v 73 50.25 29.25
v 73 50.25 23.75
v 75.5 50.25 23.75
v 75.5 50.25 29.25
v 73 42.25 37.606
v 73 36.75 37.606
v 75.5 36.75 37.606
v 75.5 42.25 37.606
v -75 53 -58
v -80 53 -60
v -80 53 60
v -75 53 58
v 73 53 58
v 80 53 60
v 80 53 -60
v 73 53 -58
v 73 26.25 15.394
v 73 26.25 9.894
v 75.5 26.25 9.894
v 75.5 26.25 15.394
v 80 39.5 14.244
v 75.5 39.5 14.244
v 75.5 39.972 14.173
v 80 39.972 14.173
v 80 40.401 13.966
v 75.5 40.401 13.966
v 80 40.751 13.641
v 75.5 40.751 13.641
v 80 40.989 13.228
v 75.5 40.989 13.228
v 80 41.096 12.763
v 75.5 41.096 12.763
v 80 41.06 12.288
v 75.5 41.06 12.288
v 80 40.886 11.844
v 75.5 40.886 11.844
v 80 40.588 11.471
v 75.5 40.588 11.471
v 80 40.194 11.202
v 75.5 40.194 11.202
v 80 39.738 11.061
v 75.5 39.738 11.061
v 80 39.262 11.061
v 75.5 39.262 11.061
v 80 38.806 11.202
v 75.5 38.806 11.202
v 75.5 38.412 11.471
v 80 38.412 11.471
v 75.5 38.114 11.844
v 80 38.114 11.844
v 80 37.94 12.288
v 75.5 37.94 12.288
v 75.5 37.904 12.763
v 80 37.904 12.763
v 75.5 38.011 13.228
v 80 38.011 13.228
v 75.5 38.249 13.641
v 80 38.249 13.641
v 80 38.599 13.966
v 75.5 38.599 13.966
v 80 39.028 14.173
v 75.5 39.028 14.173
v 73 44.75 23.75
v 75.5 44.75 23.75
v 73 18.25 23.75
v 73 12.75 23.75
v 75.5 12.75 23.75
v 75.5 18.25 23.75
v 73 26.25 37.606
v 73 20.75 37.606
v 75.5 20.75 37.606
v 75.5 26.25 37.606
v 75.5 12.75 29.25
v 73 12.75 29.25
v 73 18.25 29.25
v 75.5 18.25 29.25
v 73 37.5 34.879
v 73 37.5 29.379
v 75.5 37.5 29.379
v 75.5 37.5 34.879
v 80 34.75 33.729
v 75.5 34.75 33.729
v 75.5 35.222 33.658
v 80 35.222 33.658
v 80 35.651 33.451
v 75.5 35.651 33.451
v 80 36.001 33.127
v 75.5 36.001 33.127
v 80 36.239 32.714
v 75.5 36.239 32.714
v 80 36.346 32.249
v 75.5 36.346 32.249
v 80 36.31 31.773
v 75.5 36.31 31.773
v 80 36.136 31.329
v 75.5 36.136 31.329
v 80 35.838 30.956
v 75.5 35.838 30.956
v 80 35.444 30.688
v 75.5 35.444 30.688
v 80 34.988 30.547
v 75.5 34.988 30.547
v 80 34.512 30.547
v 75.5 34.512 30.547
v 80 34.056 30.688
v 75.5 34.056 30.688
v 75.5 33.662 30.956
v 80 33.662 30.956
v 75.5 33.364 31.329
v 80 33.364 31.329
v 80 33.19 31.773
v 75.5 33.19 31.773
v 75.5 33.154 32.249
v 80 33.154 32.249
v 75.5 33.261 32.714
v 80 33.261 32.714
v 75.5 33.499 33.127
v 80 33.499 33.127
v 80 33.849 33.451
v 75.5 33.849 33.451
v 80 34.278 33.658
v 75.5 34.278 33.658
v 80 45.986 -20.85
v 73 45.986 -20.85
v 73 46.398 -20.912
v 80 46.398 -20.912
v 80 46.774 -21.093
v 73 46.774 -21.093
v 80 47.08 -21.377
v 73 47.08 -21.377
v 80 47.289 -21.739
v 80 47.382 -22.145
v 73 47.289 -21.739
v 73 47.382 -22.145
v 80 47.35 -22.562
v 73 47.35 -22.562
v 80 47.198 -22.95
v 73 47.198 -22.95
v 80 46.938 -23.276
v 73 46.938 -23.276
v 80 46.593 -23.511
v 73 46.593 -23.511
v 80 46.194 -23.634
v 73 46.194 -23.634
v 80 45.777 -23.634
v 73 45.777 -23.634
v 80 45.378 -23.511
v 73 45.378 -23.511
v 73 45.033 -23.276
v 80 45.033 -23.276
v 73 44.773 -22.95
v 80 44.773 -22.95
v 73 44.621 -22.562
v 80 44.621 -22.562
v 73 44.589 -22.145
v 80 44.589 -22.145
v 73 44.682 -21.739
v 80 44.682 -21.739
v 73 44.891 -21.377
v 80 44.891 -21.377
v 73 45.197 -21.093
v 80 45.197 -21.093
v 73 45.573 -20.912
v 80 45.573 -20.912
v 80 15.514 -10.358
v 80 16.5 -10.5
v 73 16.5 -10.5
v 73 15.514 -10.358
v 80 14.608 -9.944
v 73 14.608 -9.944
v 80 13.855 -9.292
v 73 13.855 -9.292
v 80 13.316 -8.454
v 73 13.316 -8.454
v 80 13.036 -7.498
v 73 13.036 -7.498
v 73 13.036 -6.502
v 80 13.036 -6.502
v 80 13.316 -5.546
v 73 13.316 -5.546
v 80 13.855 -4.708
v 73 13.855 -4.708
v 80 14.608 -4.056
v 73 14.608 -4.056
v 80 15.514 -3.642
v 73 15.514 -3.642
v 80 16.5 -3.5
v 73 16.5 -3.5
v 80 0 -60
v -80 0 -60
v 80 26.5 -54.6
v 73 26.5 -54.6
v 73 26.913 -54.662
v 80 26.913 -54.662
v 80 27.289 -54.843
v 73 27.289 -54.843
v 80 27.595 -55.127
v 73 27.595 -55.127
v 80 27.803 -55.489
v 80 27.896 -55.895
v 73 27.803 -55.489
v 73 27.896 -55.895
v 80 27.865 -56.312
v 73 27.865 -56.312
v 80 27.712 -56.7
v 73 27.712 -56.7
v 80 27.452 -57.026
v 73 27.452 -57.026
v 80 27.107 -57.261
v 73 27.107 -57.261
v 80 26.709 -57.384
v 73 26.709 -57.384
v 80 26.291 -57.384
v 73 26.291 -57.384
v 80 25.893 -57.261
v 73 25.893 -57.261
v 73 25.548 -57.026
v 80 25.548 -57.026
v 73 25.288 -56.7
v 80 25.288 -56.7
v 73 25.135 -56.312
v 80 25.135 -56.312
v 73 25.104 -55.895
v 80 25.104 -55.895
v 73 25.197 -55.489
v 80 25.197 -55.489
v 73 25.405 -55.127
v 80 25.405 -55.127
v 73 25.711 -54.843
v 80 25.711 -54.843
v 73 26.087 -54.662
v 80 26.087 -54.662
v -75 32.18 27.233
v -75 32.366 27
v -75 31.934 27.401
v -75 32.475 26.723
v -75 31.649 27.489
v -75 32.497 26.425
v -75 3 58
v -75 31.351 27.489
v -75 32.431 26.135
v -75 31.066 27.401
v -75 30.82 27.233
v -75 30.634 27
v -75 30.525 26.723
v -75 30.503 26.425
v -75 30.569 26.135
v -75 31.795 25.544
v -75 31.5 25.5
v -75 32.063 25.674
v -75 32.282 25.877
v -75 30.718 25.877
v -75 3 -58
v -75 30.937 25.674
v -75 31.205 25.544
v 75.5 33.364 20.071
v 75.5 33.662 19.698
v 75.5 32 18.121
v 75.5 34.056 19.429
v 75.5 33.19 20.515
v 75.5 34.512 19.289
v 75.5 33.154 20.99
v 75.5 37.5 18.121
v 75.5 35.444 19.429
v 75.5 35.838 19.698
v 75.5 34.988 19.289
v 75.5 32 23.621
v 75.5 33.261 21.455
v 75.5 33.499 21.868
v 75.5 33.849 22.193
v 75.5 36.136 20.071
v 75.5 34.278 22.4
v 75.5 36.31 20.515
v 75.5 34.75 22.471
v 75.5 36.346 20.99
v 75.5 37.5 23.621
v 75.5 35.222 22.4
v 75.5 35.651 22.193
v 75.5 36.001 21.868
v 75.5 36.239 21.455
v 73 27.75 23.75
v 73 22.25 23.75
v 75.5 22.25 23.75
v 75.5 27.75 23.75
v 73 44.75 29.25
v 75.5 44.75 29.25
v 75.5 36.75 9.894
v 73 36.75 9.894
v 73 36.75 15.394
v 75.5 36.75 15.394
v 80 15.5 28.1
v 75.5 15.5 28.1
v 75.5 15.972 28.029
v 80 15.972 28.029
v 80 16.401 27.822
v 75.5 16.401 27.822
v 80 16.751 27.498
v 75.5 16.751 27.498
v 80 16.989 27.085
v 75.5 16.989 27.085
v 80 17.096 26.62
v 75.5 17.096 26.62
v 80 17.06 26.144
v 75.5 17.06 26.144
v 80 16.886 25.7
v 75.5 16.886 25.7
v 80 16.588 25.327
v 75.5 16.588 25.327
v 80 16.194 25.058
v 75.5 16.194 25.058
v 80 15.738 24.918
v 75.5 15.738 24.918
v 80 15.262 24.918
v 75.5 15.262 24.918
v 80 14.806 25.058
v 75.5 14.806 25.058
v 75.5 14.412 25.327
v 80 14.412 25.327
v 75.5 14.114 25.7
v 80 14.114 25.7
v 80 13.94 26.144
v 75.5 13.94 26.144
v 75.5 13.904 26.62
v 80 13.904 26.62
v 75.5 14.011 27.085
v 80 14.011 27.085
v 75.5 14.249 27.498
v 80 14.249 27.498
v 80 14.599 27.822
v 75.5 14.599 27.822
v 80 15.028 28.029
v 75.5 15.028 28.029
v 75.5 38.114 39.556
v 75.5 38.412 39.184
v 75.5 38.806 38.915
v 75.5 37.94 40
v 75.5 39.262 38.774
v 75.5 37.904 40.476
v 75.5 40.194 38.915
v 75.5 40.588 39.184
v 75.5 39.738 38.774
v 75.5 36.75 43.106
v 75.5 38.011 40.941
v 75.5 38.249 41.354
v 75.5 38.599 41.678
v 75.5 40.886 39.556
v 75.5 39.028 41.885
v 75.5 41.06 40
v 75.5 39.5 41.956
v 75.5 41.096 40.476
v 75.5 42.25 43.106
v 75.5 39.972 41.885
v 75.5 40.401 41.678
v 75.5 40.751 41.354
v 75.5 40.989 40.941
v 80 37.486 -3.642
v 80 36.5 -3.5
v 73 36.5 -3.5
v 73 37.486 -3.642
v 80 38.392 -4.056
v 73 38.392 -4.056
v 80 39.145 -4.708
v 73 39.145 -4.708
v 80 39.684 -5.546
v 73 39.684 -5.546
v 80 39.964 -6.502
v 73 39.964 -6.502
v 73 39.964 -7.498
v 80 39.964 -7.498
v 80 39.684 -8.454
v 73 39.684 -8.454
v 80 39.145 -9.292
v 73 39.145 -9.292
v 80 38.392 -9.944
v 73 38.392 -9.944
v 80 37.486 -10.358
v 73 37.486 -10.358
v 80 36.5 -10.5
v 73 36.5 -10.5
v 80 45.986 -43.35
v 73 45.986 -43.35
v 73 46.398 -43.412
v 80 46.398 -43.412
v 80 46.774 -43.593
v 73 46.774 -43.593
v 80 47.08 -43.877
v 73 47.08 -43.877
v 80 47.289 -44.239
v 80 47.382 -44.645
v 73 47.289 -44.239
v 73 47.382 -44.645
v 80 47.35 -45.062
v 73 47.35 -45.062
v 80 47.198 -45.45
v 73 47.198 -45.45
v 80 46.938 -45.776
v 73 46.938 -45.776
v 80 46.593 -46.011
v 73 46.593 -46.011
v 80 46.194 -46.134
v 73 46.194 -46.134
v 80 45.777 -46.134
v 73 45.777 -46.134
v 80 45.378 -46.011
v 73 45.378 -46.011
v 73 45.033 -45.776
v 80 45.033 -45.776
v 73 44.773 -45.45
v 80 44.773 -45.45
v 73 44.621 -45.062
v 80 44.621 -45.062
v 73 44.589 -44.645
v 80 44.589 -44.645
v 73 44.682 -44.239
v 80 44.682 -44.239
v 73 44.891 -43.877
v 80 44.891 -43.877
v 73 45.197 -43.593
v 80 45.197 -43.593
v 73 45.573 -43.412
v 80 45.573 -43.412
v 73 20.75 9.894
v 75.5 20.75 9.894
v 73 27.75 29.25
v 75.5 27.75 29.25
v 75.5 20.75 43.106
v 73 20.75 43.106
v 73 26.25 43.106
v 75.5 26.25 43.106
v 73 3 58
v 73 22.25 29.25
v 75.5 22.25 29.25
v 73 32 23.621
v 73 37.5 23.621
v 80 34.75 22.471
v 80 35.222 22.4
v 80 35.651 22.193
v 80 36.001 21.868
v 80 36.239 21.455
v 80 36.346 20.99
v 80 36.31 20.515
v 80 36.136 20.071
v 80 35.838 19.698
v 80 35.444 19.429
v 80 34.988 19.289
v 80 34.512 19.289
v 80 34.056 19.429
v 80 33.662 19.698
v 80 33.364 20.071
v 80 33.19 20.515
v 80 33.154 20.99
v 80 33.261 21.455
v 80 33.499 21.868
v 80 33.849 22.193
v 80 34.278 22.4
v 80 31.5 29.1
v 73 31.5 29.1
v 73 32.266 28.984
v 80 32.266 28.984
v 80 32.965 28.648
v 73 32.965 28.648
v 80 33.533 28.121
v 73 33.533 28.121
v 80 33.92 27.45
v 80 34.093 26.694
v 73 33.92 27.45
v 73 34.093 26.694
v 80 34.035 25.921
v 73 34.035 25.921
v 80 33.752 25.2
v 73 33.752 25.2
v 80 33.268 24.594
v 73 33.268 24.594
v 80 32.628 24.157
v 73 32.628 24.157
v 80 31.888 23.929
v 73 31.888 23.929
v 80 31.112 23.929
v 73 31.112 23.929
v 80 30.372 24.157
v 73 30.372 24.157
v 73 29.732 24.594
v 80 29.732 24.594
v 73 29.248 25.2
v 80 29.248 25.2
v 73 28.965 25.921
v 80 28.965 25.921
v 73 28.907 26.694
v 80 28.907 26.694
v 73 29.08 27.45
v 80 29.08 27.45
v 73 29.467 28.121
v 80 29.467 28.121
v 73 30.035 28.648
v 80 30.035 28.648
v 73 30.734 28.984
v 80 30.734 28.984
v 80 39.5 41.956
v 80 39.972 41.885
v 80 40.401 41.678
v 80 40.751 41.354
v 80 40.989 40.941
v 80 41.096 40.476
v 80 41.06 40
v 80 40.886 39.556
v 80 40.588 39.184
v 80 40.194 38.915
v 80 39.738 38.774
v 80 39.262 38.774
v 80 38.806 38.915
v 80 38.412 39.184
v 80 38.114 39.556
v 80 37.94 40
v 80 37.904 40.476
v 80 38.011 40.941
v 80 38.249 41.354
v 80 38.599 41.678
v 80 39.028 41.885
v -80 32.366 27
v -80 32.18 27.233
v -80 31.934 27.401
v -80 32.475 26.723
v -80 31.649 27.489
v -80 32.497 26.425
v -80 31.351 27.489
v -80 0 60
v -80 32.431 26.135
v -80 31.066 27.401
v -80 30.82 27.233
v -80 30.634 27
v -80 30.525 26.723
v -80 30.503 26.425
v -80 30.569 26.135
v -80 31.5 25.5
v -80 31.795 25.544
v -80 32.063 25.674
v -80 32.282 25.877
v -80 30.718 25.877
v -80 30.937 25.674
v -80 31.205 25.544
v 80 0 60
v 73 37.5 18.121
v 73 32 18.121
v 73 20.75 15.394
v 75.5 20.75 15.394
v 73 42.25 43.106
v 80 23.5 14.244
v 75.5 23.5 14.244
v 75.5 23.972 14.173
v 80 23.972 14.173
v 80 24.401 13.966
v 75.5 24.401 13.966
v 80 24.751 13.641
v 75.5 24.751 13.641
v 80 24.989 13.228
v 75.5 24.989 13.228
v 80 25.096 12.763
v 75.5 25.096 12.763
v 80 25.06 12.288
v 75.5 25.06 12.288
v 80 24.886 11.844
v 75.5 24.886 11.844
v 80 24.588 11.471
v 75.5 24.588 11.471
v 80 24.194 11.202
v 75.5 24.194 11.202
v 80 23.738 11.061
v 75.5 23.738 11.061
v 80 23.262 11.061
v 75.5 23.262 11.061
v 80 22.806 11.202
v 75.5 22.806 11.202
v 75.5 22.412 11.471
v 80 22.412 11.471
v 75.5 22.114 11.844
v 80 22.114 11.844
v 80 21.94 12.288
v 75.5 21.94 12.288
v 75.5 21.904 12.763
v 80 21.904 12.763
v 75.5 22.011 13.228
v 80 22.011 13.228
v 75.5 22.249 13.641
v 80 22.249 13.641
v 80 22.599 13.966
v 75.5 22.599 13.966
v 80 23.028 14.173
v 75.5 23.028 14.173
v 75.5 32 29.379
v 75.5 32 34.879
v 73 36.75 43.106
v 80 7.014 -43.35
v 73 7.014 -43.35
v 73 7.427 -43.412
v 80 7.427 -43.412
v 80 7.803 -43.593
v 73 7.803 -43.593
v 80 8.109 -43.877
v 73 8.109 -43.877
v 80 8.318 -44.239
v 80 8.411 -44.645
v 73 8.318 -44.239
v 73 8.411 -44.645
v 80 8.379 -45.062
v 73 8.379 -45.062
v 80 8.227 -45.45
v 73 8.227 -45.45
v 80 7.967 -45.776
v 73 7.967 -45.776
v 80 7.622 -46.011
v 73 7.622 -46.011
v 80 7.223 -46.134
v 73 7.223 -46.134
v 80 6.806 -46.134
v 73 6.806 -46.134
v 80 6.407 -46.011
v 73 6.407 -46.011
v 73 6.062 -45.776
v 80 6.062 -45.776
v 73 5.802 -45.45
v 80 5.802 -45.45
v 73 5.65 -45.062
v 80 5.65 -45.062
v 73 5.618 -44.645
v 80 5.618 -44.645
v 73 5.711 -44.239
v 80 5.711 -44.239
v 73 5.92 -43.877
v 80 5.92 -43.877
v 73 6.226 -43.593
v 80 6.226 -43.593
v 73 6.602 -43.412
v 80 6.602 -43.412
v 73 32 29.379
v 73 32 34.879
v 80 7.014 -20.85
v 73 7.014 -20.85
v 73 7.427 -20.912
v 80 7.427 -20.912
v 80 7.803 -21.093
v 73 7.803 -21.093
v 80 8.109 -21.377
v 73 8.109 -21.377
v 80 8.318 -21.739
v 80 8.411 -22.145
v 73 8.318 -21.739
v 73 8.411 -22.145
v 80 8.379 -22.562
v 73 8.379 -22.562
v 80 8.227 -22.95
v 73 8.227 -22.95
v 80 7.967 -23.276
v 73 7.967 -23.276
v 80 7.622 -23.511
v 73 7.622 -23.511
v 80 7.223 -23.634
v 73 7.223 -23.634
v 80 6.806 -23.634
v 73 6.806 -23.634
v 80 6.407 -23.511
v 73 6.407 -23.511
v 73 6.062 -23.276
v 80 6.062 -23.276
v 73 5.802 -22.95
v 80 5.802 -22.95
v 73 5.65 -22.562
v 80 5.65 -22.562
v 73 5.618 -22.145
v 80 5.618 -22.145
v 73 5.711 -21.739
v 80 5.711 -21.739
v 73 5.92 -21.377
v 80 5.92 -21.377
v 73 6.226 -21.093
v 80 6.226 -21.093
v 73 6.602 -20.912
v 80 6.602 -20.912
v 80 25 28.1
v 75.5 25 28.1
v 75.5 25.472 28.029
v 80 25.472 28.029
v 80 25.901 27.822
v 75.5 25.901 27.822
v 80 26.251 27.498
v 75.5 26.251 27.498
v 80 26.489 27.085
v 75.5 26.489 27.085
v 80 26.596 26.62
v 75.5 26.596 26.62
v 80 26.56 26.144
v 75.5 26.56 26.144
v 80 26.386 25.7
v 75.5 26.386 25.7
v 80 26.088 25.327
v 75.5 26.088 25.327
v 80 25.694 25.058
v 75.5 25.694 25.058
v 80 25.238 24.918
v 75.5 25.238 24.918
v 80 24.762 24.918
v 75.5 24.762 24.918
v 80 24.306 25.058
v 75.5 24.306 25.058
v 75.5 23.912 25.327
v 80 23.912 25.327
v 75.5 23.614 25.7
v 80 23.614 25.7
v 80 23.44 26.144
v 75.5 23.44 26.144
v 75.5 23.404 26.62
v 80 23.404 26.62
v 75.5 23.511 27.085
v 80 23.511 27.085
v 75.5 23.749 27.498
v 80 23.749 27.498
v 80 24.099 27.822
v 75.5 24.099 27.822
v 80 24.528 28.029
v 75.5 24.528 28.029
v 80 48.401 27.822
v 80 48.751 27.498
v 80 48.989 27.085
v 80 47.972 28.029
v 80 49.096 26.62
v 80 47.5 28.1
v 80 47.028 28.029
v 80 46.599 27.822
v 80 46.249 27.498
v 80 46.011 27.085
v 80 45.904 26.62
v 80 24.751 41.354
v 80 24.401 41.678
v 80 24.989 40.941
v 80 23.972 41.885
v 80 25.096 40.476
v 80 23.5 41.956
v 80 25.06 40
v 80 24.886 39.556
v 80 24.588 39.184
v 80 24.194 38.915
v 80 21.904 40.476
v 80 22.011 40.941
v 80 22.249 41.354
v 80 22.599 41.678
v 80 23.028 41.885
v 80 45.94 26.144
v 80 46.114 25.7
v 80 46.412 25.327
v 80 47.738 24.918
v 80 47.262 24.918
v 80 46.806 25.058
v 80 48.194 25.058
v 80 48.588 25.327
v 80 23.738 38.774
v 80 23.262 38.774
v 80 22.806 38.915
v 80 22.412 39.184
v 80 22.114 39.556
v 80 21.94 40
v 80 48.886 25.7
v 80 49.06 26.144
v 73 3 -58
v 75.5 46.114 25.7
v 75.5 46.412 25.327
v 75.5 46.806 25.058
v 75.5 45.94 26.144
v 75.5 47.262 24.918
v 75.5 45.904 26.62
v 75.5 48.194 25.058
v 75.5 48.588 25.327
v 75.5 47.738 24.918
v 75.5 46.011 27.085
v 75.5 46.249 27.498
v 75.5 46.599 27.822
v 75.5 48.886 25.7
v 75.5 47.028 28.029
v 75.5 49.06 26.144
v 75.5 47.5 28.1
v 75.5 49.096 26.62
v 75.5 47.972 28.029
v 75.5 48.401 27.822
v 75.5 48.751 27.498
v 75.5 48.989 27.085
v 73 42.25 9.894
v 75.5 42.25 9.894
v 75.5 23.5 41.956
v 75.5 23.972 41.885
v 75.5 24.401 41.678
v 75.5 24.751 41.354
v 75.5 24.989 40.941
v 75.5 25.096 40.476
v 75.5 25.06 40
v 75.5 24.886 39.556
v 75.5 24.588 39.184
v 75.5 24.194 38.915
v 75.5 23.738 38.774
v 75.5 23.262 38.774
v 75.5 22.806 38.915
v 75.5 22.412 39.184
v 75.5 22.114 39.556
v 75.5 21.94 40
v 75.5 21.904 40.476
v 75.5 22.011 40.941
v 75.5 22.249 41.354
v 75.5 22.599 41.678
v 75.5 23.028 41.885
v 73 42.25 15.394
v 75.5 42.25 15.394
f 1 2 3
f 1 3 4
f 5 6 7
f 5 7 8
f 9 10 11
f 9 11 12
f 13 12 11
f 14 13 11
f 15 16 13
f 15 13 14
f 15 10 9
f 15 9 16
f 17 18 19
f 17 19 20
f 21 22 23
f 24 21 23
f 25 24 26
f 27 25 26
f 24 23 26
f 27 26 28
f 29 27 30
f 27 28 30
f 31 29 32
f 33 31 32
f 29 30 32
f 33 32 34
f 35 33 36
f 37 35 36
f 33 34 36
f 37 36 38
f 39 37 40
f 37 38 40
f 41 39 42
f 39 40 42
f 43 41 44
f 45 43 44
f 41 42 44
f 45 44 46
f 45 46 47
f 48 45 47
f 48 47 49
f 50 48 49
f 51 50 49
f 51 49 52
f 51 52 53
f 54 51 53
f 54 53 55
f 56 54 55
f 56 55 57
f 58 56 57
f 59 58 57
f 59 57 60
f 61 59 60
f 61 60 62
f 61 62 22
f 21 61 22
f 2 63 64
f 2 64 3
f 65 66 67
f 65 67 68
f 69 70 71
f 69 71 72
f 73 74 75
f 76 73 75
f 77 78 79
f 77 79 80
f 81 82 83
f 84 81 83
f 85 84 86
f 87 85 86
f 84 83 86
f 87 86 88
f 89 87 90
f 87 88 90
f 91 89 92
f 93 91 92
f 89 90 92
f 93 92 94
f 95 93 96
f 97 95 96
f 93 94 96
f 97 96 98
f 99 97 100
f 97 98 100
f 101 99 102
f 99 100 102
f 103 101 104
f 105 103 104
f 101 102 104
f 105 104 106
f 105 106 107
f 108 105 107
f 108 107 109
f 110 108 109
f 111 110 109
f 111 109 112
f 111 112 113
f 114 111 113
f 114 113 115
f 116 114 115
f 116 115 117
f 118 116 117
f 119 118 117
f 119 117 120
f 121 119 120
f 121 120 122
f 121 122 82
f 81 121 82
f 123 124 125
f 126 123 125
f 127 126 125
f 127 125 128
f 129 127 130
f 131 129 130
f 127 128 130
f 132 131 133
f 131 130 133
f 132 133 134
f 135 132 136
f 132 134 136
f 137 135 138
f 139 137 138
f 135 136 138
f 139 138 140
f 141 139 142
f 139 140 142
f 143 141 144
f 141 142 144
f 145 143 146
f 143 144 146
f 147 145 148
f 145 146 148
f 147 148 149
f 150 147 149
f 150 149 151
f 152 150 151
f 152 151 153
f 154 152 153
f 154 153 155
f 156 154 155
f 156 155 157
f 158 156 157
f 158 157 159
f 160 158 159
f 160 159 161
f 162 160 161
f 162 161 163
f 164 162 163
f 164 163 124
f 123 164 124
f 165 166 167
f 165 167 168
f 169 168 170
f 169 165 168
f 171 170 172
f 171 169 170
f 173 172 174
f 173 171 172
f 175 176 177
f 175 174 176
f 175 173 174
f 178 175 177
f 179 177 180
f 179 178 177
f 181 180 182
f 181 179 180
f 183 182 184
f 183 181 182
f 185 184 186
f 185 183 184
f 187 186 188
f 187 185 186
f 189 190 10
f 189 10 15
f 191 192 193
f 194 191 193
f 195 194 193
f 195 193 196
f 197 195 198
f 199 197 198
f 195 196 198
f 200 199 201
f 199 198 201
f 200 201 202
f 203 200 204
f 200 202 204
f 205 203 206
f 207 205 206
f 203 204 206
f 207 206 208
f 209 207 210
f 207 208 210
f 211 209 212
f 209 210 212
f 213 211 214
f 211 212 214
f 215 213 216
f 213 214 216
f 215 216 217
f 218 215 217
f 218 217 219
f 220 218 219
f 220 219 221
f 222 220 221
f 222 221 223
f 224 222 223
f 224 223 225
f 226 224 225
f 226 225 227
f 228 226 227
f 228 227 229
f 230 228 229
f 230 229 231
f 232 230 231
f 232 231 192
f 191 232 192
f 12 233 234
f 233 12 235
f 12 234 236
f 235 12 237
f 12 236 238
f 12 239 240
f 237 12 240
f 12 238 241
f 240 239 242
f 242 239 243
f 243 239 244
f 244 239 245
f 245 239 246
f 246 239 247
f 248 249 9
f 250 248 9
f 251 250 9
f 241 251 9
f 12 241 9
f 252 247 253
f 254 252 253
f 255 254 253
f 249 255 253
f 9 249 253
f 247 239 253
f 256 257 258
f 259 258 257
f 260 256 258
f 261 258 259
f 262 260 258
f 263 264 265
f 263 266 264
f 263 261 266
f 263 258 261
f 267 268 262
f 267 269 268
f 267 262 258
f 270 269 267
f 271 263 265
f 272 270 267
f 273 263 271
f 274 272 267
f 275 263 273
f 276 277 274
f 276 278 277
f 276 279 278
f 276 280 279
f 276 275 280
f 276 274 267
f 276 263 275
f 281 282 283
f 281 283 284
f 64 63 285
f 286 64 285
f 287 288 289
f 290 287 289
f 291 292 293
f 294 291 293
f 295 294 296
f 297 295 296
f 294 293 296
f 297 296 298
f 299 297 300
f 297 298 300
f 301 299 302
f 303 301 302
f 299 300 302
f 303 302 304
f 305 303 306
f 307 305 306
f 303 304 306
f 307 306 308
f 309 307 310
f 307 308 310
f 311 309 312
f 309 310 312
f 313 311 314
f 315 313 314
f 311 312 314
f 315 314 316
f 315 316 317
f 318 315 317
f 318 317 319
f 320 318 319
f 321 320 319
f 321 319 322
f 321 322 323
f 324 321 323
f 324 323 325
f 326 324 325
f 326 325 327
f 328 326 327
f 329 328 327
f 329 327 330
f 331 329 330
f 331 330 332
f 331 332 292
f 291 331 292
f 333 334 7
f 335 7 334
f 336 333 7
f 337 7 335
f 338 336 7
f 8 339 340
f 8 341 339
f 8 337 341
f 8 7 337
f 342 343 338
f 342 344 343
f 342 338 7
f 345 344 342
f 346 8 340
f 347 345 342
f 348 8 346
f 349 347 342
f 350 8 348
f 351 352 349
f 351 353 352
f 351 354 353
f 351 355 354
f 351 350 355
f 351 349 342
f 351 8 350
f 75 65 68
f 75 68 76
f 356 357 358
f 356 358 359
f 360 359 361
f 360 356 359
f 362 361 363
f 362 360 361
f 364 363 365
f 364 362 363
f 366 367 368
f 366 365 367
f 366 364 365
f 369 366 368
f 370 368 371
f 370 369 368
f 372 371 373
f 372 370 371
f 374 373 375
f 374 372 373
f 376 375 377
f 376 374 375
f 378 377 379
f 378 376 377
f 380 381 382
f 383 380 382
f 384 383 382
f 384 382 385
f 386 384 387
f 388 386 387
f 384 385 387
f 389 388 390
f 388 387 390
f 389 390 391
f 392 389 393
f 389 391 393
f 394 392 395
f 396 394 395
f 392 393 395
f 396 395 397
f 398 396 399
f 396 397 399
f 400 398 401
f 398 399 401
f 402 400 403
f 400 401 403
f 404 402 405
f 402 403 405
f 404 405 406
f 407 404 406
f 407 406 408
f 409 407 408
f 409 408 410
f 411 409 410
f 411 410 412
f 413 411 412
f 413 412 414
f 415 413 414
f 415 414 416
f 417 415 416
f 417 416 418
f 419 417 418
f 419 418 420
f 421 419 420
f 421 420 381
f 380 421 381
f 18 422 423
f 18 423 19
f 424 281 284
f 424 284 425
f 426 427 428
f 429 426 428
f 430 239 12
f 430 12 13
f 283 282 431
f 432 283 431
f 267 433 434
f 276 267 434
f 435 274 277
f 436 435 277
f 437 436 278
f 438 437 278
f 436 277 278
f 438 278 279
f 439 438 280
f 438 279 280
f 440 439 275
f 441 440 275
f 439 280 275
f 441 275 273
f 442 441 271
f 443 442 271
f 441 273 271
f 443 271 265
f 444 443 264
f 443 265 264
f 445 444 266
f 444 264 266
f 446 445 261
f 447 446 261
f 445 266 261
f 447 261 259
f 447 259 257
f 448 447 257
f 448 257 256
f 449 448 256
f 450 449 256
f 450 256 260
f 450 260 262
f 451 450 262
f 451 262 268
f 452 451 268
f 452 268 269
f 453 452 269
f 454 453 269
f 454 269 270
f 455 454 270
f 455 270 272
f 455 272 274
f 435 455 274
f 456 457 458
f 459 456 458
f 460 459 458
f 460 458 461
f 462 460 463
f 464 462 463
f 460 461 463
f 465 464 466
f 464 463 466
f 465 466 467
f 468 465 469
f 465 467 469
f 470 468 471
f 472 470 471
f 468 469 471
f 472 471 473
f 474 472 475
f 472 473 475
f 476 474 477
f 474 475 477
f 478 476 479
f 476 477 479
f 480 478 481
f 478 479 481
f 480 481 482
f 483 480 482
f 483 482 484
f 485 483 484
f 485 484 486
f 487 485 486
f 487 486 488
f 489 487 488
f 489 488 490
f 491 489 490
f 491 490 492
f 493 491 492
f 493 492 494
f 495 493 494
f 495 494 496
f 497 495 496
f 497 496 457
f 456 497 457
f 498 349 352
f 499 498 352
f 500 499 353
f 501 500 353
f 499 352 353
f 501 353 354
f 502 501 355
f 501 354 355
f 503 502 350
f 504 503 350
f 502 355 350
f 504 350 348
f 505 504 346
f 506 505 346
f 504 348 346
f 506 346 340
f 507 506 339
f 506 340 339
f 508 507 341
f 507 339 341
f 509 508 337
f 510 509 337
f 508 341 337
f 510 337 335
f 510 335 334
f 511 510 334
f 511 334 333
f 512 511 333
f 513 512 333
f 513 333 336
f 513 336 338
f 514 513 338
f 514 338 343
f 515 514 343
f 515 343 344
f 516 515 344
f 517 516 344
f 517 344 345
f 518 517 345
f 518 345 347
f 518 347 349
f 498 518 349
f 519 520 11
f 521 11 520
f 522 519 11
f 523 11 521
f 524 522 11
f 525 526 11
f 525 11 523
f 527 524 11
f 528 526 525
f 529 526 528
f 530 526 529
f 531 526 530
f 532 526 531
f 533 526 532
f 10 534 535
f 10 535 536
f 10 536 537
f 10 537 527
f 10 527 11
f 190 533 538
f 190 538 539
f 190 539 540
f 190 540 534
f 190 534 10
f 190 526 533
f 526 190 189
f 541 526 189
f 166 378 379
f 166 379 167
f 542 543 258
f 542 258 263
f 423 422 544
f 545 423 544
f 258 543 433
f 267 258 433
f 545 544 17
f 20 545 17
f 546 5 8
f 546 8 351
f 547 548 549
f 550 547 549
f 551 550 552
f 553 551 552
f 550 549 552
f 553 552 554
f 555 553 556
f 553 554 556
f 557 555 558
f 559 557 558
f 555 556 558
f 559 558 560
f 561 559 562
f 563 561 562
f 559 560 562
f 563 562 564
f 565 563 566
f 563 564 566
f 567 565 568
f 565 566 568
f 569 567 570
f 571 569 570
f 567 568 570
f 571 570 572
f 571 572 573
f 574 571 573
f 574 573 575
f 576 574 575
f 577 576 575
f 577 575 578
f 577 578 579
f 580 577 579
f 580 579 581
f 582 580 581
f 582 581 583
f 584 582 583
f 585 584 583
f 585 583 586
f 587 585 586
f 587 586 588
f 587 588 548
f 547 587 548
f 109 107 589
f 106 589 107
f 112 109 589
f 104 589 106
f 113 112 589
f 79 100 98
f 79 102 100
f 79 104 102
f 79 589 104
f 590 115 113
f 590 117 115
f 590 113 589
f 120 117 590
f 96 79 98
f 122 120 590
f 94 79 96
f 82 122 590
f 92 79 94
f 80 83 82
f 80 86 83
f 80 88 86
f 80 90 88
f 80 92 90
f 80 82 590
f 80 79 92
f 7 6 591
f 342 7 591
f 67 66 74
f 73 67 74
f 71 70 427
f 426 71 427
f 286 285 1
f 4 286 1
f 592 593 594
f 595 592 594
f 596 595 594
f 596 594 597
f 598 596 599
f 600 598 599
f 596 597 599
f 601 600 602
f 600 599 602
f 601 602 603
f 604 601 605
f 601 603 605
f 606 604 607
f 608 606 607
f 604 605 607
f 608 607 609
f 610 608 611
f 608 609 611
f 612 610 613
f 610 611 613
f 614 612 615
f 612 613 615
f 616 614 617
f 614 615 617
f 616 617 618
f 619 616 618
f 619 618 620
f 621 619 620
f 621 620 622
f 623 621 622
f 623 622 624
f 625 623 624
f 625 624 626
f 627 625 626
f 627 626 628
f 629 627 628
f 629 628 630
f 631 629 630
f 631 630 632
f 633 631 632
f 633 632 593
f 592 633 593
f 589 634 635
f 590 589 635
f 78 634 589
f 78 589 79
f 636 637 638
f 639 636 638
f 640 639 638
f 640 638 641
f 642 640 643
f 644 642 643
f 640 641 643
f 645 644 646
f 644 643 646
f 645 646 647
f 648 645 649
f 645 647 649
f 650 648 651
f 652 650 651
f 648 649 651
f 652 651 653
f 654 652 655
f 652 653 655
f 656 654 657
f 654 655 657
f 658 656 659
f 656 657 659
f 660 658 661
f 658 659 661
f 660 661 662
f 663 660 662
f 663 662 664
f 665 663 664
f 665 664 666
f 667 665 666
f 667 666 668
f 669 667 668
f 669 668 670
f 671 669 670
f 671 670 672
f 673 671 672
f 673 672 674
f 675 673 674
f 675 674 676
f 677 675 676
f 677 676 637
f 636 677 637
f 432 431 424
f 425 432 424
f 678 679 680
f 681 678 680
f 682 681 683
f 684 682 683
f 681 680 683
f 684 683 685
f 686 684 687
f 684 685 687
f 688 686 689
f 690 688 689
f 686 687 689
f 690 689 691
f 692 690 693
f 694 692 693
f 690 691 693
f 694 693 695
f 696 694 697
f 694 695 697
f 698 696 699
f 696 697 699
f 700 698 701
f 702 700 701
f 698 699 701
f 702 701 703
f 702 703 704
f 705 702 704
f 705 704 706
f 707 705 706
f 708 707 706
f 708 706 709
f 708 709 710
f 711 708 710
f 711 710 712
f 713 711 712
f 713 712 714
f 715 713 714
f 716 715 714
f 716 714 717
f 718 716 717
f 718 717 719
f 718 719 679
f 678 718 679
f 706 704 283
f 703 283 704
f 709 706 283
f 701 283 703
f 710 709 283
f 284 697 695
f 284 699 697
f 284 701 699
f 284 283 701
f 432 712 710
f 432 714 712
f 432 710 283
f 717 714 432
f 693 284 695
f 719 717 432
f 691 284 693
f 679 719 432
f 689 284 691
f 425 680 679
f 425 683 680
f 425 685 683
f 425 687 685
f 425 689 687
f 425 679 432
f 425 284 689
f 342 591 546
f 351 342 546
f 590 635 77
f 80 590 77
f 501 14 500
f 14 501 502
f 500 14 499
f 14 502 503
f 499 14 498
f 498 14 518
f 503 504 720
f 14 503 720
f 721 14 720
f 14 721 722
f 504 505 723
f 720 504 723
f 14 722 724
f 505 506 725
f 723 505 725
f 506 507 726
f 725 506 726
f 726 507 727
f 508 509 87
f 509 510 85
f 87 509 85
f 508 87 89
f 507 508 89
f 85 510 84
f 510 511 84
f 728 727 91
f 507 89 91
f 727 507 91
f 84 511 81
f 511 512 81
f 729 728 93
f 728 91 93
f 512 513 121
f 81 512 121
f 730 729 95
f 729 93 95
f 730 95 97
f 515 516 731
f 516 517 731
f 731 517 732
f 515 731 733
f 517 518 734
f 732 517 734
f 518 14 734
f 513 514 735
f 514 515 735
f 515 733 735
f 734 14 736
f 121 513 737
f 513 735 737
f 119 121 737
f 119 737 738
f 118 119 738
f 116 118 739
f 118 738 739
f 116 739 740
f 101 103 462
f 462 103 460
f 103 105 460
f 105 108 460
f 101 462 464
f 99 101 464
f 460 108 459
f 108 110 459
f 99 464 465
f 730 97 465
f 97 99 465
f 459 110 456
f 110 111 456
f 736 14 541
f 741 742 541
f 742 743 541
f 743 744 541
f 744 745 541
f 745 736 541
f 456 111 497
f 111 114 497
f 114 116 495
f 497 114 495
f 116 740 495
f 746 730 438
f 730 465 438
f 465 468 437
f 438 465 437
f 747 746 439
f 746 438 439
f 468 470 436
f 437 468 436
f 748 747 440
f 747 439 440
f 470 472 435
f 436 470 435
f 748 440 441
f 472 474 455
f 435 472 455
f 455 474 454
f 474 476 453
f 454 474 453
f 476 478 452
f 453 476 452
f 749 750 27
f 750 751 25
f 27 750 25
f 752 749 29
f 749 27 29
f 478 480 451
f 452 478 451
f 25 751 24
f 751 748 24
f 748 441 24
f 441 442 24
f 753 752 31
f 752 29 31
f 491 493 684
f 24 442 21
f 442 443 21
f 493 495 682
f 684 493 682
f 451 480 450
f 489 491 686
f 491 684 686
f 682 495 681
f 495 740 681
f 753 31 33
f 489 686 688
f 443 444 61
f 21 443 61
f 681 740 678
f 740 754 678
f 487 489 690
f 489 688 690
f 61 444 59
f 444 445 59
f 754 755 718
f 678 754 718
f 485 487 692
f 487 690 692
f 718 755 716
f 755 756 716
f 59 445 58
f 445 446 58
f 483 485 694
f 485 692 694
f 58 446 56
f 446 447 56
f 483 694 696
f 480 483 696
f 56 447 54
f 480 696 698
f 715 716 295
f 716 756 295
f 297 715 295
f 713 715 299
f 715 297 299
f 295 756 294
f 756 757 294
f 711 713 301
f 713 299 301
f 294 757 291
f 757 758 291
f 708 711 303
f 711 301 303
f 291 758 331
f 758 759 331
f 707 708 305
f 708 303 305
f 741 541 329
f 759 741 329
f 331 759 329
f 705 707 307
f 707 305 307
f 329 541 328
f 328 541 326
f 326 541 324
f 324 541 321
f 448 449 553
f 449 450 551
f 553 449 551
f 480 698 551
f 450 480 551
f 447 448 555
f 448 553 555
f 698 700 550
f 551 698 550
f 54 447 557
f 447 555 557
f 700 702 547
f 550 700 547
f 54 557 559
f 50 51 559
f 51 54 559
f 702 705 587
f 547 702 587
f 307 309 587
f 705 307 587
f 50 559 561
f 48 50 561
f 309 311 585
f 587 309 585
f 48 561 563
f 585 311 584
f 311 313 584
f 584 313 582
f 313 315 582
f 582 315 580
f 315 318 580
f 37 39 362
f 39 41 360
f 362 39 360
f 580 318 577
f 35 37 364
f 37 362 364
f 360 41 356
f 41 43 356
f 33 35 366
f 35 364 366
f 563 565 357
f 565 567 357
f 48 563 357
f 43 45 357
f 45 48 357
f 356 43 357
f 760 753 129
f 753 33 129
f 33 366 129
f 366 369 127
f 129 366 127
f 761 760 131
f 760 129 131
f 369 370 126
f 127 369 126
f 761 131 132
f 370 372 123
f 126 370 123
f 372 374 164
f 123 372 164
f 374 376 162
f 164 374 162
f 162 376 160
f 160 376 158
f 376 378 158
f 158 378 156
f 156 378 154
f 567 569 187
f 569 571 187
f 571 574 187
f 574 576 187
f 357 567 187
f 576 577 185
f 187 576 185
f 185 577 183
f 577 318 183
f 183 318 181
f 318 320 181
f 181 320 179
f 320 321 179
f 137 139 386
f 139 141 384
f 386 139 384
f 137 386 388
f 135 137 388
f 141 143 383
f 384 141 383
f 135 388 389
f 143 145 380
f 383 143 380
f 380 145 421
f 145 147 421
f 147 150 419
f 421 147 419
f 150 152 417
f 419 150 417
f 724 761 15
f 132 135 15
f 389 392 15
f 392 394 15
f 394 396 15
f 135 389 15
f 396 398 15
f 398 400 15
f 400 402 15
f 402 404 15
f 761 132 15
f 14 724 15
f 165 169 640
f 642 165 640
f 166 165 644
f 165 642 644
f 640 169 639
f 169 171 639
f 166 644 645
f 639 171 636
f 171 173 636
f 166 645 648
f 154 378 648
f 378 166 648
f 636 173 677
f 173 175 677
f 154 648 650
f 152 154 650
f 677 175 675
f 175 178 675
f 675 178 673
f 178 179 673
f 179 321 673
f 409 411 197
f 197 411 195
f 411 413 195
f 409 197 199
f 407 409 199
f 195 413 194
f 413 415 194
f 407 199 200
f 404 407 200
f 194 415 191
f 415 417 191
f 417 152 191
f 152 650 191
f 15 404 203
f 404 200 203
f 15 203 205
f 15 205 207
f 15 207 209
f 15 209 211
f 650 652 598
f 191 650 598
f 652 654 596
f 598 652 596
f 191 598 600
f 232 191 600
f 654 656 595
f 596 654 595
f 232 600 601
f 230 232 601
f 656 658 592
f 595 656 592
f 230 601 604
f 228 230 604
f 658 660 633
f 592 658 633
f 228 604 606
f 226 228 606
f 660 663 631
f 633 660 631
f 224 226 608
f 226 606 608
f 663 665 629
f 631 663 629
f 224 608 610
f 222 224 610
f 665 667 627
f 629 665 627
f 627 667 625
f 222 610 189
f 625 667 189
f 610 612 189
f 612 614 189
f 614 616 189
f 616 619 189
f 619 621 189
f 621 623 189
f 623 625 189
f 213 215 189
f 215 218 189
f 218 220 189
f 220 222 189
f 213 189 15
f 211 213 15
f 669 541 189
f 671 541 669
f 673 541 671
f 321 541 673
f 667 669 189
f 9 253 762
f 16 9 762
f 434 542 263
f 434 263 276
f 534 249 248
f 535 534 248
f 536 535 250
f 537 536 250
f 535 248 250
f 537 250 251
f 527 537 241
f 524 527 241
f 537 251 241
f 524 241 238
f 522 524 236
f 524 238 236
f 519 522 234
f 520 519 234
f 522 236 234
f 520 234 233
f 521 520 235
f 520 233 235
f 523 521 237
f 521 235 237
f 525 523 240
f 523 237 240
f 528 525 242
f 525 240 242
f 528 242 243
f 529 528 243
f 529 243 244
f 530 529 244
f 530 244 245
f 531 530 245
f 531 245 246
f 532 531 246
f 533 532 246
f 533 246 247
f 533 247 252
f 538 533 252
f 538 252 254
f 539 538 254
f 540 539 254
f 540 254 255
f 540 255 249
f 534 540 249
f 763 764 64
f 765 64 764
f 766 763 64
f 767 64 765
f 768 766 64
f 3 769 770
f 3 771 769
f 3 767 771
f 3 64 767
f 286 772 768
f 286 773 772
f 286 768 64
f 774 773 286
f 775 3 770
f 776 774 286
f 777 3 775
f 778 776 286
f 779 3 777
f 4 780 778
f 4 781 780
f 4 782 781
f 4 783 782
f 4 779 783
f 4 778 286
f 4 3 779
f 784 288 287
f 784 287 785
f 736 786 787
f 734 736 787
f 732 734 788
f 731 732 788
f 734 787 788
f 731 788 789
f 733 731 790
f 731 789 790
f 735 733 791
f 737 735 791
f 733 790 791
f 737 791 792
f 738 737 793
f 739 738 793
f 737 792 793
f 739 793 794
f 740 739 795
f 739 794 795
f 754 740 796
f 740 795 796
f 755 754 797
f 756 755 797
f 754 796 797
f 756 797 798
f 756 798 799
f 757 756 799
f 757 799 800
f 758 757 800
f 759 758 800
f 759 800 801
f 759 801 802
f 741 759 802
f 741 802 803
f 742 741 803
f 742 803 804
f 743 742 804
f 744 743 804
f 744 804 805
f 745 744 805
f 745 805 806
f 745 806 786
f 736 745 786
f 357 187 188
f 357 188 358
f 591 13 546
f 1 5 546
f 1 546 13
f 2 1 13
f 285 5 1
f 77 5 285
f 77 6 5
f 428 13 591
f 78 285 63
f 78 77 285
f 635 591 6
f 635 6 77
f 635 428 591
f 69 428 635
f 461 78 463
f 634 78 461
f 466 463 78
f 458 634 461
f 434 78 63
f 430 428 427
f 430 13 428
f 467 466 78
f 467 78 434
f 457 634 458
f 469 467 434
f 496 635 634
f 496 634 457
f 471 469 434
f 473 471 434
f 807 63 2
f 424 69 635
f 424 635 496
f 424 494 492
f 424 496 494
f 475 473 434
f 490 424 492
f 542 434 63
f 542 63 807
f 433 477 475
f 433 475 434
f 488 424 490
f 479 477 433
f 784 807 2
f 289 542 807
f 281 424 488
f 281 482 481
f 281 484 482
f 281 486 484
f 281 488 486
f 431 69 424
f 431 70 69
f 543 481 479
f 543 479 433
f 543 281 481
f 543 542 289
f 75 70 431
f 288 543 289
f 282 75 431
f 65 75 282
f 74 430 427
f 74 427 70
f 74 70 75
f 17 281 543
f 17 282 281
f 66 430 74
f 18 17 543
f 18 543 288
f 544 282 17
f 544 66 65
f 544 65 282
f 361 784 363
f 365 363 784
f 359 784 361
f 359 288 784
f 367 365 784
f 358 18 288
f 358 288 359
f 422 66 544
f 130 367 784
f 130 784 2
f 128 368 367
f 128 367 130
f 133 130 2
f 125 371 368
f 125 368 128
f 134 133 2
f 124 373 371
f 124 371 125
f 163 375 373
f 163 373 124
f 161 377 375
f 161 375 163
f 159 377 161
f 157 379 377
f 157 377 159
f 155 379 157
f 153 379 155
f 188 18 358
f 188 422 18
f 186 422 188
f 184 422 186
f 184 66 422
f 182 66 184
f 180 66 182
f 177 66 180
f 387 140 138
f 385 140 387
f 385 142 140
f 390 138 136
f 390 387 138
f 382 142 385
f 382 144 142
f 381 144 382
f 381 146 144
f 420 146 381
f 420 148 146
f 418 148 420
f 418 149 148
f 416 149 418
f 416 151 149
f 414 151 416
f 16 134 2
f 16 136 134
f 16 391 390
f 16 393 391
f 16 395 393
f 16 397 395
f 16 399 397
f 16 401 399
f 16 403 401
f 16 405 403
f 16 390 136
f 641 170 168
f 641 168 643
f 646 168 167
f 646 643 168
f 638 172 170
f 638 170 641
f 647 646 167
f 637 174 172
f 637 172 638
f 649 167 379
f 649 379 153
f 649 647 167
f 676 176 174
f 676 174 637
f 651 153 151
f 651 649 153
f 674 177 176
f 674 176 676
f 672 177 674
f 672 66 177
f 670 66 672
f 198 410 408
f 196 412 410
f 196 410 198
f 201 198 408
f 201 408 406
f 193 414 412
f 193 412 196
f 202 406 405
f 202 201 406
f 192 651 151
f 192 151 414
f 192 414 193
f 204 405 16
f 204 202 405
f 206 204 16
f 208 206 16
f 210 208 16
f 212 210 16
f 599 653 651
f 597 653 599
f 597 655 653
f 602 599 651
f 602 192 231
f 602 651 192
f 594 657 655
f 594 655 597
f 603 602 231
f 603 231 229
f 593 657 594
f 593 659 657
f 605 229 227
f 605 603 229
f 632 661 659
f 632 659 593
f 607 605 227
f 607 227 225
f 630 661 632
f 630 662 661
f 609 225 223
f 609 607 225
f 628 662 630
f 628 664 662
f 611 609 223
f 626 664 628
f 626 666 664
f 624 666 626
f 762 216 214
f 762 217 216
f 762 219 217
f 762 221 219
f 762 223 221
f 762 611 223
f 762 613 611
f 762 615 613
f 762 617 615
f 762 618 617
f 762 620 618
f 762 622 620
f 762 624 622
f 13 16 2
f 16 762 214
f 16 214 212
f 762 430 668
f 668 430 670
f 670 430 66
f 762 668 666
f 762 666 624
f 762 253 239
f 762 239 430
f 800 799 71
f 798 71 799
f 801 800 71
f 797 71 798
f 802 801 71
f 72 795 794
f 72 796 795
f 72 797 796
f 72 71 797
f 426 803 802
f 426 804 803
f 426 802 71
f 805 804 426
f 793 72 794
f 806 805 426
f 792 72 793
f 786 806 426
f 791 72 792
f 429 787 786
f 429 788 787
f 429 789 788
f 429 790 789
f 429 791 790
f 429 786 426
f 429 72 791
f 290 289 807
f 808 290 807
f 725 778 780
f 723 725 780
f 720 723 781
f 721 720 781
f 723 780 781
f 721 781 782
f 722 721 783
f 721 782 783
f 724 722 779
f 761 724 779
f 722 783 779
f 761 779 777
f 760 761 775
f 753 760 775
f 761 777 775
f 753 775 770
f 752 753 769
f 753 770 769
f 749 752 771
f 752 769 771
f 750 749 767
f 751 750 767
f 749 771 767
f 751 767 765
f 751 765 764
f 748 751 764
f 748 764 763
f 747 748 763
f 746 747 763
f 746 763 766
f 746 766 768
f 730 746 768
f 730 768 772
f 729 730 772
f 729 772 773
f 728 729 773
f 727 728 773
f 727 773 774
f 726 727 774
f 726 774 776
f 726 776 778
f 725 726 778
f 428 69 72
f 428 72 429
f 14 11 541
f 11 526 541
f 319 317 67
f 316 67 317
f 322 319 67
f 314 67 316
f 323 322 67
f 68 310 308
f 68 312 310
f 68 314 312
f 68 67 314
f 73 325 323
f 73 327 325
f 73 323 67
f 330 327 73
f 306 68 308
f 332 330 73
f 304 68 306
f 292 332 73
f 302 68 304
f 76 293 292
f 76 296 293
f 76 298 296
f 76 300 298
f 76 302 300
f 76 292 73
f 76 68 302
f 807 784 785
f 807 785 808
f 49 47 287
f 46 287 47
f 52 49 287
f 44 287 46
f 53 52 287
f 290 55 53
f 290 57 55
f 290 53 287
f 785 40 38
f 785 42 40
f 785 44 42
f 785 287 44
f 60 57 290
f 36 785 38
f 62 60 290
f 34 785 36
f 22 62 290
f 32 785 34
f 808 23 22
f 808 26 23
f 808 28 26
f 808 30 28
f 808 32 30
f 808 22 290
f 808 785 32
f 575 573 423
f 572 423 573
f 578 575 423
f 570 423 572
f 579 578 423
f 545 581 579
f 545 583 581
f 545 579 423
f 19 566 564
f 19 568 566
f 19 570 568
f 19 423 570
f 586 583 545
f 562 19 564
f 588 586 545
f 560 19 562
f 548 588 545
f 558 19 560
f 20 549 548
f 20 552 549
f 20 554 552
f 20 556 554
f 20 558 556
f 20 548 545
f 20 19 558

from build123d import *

# Parameters (mm, degrees)
SKETCH1_W           = 160
SKETCH1_H           = 120
BOSS_EXTRUDE1_DEPTH = 3
SKETCH2_W           = 160
SKETCH2_H           = 120
SKETCH2_W_2         = 148
SKETCH2_H_2         = 116
BOSS_EXTRUDE2_DEPTH = 50
SKETCH3_R           = 1
CUT_EXTRUDE1_DEPTH  = 179.910592196
SKETCH4_R           = 1.6
SKETCH4_R_2         = 2.6
SKETCH4_R_3         = 1.4
CUT_EXTRUDE2_DEPTH  = 173.678892746
SKETCH5_W           = 5.5
SKETCH5_H           = 5.5
NUT_CAVITIES_DEPTH  = 2.5
CUT_EXTRUDE3_DEPTH  = 10


with BuildPart() as part:
    # Sketch1 → Boss-Extrude1 (new body)
    with BuildSketch(Plane(origin=(0, 0, 0), x_dir=(1, 0, 0), z_dir=(0, 1, 0))):
        Rectangle(SKETCH1_W, SKETCH1_H)
    extrude(amount=BOSS_EXTRUDE1_DEPTH)

    # Sketch2 → Boss-Extrude2 (add)
    with BuildSketch(Plane(origin=(0, 3, 0), x_dir=(1, 0, 0), z_dir=(0, 1, 0))):
        Rectangle(SKETCH2_W, SKETCH2_H)
        with Locations((-1, 0)):
            Rectangle(SKETCH2_W_2, SKETCH2_H_2, mode=Mode.SUBTRACT)
    extrude(amount=BOSS_EXTRUDE2_DEPTH)

    # Sketch3 → Cut-Extrude1 (cut, through all)
    with BuildSketch(Plane(origin=(80, 0, 0), x_dir=(0, 0, -1), z_dir=(1, 0, 0))):
        with Locations((-26.5, 31.5)):
            Circle(SKETCH3_R)
    extrude(amount=-CUT_EXTRUDE1_DEPTH, mode=Mode.SUBTRACT)

    # Sketch4 → Cut-Extrude2 (cut, through all)
    with BuildSketch(Plane.ZY.offset(-73)):
        with Locations((26.5, 25)):
            Circle(SKETCH4_R)
        with Locations((32.129165125, 34.75)):
            Circle(SKETCH4_R)
        with Locations((20.870834875, 34.75)):
            Circle(SKETCH4_R)
        with Locations((26.5, 31.5)):
            Circle(SKETCH4_R_2)
        with Locations((26.5, 47.5)):
            Circle(SKETCH4_R)
        with Locations((12.643593539, 39.5)):
            Circle(SKETCH4_R)
        with Locations((12.643593539, 23.5)):
            Circle(SKETCH4_R)
        with Locations((26.5, 15.5)):
            Circle(SKETCH4_R)
        with Locations((40.356406461, 23.5)):
            Circle(SKETCH4_R)
        with Locations((40.356406461, 39.5)):
            Circle(SKETCH4_R)
        with Locations((-22.25, 45.985571585)):
            Circle(SKETCH4_R_3)
        with Locations((-44.75, 45.985571585)):
            Circle(SKETCH4_R_3)
        with Locations((-56, 26.5)):
            Circle(SKETCH4_R_3)
        with Locations((-44.75, 7.014428415)):
            Circle(SKETCH4_R_3)
        with Locations((-22.25, 7.014428415)):
            Circle(SKETCH4_R_3)
    extrude(amount=-CUT_EXTRUDE2_DEPTH, mode=Mode.SUBTRACT)

    # Sketch5 → Nut cavities (cut)
    with BuildSketch(Plane.ZY.offset(-73)):
        with Locations((12.643593539, 39.5)):
            Rectangle(SKETCH5_W, SKETCH5_H)
        with Locations((26.5, 47.5)):
            Rectangle(SKETCH5_W, SKETCH5_H)
        with Locations((20.870834875, 34.75)):
            Rectangle(SKETCH5_W, SKETCH5_H)
        with Locations((12.643593539, 23.5)):
            Rectangle(SKETCH5_W, SKETCH5_H)
        with Locations((26.5, 15.5)):
            Rectangle(SKETCH5_W, SKETCH5_H)
        with Locations((26.5, 25)):
            Rectangle(SKETCH5_W, SKETCH5_H)
        with Locations((40.356406461, 23.5)):
            Rectangle(SKETCH5_W, SKETCH5_H)
        with Locations((32.129165125, 34.75)):
            Rectangle(SKETCH5_W, SKETCH5_H)
        with Locations((40.356406461, 39.5)):
            Rectangle(SKETCH5_W, SKETCH5_H)
    extrude(amount=-NUT_CAVITIES_DEPTH, mode=Mode.SUBTRACT)

    # Sketch8 → Cut-Extrude3 (cut)
    with BuildSketch(Plane(origin=(80, 0, 0), x_dir=(0, 0, -1), z_dir=(1, 0, 0))):
        with BuildLine():
            Line((10.5, 36.5), (10.5, 16.5))
            ThreePointArc((10.5, 16.5), (7, 13), (3.5, 16.5))
            Line((3.5, 16.5), (3.5, 36.5))
            ThreePointArc((3.5, 36.5), (7, 40), (10.5, 36.5))
        make_face()
    extrude(amount=-CUT_EXTRUDE3_DEPTH, mode=Mode.SUBTRACT)


solid = part.part
